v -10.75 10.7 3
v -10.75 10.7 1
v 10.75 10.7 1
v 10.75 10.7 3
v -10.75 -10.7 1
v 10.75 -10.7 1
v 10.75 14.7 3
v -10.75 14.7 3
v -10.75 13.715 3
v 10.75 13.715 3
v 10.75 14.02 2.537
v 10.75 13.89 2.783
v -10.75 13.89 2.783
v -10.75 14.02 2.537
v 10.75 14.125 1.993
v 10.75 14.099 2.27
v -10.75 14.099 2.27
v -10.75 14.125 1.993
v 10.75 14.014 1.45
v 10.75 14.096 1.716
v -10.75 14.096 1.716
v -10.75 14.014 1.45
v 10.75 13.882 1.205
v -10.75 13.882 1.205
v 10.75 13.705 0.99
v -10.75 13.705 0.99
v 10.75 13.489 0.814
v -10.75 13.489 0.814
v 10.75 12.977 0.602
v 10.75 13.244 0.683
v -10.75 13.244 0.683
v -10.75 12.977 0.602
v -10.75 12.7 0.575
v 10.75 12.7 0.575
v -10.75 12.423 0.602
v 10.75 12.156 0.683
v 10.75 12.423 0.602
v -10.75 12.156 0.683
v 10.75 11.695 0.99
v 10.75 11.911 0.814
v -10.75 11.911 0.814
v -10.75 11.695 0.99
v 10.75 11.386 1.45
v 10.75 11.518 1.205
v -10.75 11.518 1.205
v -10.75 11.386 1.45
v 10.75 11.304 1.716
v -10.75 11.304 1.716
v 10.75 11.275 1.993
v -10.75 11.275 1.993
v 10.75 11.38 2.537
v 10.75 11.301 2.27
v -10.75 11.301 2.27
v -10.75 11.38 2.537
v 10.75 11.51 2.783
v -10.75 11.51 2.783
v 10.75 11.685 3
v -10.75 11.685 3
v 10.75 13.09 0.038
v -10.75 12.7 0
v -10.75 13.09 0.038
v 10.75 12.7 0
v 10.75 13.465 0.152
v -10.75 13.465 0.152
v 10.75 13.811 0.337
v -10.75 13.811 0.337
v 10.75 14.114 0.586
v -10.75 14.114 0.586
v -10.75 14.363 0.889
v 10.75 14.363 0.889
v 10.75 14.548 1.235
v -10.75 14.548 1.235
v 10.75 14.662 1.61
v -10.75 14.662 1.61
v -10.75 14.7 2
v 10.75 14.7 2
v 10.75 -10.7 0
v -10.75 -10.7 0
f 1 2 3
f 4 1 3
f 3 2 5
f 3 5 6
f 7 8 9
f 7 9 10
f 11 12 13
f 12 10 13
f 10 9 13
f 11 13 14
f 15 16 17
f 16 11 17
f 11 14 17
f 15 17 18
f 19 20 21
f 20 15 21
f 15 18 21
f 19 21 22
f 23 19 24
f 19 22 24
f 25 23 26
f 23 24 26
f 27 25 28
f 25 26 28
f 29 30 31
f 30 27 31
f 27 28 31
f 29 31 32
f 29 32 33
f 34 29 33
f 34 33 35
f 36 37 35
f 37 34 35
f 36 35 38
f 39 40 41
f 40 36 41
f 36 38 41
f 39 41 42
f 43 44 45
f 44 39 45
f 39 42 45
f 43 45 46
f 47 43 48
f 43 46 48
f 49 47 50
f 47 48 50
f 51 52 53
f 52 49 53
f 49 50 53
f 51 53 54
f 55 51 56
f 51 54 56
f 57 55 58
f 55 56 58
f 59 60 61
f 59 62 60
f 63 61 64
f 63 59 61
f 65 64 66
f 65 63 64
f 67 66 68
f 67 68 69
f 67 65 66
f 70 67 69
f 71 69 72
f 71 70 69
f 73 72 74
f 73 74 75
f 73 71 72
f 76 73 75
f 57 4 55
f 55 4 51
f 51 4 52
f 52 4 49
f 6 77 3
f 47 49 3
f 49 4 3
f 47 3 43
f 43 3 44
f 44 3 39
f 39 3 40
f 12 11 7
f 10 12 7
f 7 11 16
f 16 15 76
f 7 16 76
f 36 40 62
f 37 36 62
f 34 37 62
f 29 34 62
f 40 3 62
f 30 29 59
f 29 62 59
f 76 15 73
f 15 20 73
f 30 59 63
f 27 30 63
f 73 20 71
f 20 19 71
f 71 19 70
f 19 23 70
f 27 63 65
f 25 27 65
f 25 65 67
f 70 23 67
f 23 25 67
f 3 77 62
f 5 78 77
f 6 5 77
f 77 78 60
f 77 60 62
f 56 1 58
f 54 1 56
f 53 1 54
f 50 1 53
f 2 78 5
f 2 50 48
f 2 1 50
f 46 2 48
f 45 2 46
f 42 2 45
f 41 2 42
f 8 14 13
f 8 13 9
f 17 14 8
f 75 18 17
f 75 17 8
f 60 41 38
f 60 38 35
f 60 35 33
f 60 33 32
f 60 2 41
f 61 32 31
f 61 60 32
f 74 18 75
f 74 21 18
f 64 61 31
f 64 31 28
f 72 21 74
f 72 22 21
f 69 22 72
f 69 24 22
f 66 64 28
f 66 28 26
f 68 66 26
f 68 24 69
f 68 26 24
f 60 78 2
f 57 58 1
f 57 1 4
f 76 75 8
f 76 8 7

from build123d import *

# Parameters (mm, degrees)
F0_W     = 21.5
F0_H     = 21.4
F1_DEPTH = 1
F0_H_2   = 4
F2_DEPTH = 3
F4_D     = 2.85
F5_R     = 2


# Not quite as in the source:
# - a feature names something its author has since deleted; it is built from what else it names


with BuildPart() as f1:
    # F0 (on Top) → F1 (new body)
    with BuildSketch(Plane.XY):
        Rectangle(F0_W, F0_H)
    extrude(amount=F1_DEPTH)

    # F0 (on Top) → F2 (join)
    with BuildSketch(Plane.XY):
        with Locations((0, 12.7)):
            Rectangle(F0_W, F0_H_2)
    extrude(amount=F2_DEPTH)

    # F4 (through all)
    with Locations(Plane.YZ.offset(10.75)):
        with Locations((12.7, 2)):
            Hole(F4_D / 2)

    # F5
    f5_edges = [f1.edges().sort_by_distance(p)[0] for p in [
        (0, 14.7, 0),
    ]]
    fillet(f5_edges, radius=F5_R)


solid = f1.part
